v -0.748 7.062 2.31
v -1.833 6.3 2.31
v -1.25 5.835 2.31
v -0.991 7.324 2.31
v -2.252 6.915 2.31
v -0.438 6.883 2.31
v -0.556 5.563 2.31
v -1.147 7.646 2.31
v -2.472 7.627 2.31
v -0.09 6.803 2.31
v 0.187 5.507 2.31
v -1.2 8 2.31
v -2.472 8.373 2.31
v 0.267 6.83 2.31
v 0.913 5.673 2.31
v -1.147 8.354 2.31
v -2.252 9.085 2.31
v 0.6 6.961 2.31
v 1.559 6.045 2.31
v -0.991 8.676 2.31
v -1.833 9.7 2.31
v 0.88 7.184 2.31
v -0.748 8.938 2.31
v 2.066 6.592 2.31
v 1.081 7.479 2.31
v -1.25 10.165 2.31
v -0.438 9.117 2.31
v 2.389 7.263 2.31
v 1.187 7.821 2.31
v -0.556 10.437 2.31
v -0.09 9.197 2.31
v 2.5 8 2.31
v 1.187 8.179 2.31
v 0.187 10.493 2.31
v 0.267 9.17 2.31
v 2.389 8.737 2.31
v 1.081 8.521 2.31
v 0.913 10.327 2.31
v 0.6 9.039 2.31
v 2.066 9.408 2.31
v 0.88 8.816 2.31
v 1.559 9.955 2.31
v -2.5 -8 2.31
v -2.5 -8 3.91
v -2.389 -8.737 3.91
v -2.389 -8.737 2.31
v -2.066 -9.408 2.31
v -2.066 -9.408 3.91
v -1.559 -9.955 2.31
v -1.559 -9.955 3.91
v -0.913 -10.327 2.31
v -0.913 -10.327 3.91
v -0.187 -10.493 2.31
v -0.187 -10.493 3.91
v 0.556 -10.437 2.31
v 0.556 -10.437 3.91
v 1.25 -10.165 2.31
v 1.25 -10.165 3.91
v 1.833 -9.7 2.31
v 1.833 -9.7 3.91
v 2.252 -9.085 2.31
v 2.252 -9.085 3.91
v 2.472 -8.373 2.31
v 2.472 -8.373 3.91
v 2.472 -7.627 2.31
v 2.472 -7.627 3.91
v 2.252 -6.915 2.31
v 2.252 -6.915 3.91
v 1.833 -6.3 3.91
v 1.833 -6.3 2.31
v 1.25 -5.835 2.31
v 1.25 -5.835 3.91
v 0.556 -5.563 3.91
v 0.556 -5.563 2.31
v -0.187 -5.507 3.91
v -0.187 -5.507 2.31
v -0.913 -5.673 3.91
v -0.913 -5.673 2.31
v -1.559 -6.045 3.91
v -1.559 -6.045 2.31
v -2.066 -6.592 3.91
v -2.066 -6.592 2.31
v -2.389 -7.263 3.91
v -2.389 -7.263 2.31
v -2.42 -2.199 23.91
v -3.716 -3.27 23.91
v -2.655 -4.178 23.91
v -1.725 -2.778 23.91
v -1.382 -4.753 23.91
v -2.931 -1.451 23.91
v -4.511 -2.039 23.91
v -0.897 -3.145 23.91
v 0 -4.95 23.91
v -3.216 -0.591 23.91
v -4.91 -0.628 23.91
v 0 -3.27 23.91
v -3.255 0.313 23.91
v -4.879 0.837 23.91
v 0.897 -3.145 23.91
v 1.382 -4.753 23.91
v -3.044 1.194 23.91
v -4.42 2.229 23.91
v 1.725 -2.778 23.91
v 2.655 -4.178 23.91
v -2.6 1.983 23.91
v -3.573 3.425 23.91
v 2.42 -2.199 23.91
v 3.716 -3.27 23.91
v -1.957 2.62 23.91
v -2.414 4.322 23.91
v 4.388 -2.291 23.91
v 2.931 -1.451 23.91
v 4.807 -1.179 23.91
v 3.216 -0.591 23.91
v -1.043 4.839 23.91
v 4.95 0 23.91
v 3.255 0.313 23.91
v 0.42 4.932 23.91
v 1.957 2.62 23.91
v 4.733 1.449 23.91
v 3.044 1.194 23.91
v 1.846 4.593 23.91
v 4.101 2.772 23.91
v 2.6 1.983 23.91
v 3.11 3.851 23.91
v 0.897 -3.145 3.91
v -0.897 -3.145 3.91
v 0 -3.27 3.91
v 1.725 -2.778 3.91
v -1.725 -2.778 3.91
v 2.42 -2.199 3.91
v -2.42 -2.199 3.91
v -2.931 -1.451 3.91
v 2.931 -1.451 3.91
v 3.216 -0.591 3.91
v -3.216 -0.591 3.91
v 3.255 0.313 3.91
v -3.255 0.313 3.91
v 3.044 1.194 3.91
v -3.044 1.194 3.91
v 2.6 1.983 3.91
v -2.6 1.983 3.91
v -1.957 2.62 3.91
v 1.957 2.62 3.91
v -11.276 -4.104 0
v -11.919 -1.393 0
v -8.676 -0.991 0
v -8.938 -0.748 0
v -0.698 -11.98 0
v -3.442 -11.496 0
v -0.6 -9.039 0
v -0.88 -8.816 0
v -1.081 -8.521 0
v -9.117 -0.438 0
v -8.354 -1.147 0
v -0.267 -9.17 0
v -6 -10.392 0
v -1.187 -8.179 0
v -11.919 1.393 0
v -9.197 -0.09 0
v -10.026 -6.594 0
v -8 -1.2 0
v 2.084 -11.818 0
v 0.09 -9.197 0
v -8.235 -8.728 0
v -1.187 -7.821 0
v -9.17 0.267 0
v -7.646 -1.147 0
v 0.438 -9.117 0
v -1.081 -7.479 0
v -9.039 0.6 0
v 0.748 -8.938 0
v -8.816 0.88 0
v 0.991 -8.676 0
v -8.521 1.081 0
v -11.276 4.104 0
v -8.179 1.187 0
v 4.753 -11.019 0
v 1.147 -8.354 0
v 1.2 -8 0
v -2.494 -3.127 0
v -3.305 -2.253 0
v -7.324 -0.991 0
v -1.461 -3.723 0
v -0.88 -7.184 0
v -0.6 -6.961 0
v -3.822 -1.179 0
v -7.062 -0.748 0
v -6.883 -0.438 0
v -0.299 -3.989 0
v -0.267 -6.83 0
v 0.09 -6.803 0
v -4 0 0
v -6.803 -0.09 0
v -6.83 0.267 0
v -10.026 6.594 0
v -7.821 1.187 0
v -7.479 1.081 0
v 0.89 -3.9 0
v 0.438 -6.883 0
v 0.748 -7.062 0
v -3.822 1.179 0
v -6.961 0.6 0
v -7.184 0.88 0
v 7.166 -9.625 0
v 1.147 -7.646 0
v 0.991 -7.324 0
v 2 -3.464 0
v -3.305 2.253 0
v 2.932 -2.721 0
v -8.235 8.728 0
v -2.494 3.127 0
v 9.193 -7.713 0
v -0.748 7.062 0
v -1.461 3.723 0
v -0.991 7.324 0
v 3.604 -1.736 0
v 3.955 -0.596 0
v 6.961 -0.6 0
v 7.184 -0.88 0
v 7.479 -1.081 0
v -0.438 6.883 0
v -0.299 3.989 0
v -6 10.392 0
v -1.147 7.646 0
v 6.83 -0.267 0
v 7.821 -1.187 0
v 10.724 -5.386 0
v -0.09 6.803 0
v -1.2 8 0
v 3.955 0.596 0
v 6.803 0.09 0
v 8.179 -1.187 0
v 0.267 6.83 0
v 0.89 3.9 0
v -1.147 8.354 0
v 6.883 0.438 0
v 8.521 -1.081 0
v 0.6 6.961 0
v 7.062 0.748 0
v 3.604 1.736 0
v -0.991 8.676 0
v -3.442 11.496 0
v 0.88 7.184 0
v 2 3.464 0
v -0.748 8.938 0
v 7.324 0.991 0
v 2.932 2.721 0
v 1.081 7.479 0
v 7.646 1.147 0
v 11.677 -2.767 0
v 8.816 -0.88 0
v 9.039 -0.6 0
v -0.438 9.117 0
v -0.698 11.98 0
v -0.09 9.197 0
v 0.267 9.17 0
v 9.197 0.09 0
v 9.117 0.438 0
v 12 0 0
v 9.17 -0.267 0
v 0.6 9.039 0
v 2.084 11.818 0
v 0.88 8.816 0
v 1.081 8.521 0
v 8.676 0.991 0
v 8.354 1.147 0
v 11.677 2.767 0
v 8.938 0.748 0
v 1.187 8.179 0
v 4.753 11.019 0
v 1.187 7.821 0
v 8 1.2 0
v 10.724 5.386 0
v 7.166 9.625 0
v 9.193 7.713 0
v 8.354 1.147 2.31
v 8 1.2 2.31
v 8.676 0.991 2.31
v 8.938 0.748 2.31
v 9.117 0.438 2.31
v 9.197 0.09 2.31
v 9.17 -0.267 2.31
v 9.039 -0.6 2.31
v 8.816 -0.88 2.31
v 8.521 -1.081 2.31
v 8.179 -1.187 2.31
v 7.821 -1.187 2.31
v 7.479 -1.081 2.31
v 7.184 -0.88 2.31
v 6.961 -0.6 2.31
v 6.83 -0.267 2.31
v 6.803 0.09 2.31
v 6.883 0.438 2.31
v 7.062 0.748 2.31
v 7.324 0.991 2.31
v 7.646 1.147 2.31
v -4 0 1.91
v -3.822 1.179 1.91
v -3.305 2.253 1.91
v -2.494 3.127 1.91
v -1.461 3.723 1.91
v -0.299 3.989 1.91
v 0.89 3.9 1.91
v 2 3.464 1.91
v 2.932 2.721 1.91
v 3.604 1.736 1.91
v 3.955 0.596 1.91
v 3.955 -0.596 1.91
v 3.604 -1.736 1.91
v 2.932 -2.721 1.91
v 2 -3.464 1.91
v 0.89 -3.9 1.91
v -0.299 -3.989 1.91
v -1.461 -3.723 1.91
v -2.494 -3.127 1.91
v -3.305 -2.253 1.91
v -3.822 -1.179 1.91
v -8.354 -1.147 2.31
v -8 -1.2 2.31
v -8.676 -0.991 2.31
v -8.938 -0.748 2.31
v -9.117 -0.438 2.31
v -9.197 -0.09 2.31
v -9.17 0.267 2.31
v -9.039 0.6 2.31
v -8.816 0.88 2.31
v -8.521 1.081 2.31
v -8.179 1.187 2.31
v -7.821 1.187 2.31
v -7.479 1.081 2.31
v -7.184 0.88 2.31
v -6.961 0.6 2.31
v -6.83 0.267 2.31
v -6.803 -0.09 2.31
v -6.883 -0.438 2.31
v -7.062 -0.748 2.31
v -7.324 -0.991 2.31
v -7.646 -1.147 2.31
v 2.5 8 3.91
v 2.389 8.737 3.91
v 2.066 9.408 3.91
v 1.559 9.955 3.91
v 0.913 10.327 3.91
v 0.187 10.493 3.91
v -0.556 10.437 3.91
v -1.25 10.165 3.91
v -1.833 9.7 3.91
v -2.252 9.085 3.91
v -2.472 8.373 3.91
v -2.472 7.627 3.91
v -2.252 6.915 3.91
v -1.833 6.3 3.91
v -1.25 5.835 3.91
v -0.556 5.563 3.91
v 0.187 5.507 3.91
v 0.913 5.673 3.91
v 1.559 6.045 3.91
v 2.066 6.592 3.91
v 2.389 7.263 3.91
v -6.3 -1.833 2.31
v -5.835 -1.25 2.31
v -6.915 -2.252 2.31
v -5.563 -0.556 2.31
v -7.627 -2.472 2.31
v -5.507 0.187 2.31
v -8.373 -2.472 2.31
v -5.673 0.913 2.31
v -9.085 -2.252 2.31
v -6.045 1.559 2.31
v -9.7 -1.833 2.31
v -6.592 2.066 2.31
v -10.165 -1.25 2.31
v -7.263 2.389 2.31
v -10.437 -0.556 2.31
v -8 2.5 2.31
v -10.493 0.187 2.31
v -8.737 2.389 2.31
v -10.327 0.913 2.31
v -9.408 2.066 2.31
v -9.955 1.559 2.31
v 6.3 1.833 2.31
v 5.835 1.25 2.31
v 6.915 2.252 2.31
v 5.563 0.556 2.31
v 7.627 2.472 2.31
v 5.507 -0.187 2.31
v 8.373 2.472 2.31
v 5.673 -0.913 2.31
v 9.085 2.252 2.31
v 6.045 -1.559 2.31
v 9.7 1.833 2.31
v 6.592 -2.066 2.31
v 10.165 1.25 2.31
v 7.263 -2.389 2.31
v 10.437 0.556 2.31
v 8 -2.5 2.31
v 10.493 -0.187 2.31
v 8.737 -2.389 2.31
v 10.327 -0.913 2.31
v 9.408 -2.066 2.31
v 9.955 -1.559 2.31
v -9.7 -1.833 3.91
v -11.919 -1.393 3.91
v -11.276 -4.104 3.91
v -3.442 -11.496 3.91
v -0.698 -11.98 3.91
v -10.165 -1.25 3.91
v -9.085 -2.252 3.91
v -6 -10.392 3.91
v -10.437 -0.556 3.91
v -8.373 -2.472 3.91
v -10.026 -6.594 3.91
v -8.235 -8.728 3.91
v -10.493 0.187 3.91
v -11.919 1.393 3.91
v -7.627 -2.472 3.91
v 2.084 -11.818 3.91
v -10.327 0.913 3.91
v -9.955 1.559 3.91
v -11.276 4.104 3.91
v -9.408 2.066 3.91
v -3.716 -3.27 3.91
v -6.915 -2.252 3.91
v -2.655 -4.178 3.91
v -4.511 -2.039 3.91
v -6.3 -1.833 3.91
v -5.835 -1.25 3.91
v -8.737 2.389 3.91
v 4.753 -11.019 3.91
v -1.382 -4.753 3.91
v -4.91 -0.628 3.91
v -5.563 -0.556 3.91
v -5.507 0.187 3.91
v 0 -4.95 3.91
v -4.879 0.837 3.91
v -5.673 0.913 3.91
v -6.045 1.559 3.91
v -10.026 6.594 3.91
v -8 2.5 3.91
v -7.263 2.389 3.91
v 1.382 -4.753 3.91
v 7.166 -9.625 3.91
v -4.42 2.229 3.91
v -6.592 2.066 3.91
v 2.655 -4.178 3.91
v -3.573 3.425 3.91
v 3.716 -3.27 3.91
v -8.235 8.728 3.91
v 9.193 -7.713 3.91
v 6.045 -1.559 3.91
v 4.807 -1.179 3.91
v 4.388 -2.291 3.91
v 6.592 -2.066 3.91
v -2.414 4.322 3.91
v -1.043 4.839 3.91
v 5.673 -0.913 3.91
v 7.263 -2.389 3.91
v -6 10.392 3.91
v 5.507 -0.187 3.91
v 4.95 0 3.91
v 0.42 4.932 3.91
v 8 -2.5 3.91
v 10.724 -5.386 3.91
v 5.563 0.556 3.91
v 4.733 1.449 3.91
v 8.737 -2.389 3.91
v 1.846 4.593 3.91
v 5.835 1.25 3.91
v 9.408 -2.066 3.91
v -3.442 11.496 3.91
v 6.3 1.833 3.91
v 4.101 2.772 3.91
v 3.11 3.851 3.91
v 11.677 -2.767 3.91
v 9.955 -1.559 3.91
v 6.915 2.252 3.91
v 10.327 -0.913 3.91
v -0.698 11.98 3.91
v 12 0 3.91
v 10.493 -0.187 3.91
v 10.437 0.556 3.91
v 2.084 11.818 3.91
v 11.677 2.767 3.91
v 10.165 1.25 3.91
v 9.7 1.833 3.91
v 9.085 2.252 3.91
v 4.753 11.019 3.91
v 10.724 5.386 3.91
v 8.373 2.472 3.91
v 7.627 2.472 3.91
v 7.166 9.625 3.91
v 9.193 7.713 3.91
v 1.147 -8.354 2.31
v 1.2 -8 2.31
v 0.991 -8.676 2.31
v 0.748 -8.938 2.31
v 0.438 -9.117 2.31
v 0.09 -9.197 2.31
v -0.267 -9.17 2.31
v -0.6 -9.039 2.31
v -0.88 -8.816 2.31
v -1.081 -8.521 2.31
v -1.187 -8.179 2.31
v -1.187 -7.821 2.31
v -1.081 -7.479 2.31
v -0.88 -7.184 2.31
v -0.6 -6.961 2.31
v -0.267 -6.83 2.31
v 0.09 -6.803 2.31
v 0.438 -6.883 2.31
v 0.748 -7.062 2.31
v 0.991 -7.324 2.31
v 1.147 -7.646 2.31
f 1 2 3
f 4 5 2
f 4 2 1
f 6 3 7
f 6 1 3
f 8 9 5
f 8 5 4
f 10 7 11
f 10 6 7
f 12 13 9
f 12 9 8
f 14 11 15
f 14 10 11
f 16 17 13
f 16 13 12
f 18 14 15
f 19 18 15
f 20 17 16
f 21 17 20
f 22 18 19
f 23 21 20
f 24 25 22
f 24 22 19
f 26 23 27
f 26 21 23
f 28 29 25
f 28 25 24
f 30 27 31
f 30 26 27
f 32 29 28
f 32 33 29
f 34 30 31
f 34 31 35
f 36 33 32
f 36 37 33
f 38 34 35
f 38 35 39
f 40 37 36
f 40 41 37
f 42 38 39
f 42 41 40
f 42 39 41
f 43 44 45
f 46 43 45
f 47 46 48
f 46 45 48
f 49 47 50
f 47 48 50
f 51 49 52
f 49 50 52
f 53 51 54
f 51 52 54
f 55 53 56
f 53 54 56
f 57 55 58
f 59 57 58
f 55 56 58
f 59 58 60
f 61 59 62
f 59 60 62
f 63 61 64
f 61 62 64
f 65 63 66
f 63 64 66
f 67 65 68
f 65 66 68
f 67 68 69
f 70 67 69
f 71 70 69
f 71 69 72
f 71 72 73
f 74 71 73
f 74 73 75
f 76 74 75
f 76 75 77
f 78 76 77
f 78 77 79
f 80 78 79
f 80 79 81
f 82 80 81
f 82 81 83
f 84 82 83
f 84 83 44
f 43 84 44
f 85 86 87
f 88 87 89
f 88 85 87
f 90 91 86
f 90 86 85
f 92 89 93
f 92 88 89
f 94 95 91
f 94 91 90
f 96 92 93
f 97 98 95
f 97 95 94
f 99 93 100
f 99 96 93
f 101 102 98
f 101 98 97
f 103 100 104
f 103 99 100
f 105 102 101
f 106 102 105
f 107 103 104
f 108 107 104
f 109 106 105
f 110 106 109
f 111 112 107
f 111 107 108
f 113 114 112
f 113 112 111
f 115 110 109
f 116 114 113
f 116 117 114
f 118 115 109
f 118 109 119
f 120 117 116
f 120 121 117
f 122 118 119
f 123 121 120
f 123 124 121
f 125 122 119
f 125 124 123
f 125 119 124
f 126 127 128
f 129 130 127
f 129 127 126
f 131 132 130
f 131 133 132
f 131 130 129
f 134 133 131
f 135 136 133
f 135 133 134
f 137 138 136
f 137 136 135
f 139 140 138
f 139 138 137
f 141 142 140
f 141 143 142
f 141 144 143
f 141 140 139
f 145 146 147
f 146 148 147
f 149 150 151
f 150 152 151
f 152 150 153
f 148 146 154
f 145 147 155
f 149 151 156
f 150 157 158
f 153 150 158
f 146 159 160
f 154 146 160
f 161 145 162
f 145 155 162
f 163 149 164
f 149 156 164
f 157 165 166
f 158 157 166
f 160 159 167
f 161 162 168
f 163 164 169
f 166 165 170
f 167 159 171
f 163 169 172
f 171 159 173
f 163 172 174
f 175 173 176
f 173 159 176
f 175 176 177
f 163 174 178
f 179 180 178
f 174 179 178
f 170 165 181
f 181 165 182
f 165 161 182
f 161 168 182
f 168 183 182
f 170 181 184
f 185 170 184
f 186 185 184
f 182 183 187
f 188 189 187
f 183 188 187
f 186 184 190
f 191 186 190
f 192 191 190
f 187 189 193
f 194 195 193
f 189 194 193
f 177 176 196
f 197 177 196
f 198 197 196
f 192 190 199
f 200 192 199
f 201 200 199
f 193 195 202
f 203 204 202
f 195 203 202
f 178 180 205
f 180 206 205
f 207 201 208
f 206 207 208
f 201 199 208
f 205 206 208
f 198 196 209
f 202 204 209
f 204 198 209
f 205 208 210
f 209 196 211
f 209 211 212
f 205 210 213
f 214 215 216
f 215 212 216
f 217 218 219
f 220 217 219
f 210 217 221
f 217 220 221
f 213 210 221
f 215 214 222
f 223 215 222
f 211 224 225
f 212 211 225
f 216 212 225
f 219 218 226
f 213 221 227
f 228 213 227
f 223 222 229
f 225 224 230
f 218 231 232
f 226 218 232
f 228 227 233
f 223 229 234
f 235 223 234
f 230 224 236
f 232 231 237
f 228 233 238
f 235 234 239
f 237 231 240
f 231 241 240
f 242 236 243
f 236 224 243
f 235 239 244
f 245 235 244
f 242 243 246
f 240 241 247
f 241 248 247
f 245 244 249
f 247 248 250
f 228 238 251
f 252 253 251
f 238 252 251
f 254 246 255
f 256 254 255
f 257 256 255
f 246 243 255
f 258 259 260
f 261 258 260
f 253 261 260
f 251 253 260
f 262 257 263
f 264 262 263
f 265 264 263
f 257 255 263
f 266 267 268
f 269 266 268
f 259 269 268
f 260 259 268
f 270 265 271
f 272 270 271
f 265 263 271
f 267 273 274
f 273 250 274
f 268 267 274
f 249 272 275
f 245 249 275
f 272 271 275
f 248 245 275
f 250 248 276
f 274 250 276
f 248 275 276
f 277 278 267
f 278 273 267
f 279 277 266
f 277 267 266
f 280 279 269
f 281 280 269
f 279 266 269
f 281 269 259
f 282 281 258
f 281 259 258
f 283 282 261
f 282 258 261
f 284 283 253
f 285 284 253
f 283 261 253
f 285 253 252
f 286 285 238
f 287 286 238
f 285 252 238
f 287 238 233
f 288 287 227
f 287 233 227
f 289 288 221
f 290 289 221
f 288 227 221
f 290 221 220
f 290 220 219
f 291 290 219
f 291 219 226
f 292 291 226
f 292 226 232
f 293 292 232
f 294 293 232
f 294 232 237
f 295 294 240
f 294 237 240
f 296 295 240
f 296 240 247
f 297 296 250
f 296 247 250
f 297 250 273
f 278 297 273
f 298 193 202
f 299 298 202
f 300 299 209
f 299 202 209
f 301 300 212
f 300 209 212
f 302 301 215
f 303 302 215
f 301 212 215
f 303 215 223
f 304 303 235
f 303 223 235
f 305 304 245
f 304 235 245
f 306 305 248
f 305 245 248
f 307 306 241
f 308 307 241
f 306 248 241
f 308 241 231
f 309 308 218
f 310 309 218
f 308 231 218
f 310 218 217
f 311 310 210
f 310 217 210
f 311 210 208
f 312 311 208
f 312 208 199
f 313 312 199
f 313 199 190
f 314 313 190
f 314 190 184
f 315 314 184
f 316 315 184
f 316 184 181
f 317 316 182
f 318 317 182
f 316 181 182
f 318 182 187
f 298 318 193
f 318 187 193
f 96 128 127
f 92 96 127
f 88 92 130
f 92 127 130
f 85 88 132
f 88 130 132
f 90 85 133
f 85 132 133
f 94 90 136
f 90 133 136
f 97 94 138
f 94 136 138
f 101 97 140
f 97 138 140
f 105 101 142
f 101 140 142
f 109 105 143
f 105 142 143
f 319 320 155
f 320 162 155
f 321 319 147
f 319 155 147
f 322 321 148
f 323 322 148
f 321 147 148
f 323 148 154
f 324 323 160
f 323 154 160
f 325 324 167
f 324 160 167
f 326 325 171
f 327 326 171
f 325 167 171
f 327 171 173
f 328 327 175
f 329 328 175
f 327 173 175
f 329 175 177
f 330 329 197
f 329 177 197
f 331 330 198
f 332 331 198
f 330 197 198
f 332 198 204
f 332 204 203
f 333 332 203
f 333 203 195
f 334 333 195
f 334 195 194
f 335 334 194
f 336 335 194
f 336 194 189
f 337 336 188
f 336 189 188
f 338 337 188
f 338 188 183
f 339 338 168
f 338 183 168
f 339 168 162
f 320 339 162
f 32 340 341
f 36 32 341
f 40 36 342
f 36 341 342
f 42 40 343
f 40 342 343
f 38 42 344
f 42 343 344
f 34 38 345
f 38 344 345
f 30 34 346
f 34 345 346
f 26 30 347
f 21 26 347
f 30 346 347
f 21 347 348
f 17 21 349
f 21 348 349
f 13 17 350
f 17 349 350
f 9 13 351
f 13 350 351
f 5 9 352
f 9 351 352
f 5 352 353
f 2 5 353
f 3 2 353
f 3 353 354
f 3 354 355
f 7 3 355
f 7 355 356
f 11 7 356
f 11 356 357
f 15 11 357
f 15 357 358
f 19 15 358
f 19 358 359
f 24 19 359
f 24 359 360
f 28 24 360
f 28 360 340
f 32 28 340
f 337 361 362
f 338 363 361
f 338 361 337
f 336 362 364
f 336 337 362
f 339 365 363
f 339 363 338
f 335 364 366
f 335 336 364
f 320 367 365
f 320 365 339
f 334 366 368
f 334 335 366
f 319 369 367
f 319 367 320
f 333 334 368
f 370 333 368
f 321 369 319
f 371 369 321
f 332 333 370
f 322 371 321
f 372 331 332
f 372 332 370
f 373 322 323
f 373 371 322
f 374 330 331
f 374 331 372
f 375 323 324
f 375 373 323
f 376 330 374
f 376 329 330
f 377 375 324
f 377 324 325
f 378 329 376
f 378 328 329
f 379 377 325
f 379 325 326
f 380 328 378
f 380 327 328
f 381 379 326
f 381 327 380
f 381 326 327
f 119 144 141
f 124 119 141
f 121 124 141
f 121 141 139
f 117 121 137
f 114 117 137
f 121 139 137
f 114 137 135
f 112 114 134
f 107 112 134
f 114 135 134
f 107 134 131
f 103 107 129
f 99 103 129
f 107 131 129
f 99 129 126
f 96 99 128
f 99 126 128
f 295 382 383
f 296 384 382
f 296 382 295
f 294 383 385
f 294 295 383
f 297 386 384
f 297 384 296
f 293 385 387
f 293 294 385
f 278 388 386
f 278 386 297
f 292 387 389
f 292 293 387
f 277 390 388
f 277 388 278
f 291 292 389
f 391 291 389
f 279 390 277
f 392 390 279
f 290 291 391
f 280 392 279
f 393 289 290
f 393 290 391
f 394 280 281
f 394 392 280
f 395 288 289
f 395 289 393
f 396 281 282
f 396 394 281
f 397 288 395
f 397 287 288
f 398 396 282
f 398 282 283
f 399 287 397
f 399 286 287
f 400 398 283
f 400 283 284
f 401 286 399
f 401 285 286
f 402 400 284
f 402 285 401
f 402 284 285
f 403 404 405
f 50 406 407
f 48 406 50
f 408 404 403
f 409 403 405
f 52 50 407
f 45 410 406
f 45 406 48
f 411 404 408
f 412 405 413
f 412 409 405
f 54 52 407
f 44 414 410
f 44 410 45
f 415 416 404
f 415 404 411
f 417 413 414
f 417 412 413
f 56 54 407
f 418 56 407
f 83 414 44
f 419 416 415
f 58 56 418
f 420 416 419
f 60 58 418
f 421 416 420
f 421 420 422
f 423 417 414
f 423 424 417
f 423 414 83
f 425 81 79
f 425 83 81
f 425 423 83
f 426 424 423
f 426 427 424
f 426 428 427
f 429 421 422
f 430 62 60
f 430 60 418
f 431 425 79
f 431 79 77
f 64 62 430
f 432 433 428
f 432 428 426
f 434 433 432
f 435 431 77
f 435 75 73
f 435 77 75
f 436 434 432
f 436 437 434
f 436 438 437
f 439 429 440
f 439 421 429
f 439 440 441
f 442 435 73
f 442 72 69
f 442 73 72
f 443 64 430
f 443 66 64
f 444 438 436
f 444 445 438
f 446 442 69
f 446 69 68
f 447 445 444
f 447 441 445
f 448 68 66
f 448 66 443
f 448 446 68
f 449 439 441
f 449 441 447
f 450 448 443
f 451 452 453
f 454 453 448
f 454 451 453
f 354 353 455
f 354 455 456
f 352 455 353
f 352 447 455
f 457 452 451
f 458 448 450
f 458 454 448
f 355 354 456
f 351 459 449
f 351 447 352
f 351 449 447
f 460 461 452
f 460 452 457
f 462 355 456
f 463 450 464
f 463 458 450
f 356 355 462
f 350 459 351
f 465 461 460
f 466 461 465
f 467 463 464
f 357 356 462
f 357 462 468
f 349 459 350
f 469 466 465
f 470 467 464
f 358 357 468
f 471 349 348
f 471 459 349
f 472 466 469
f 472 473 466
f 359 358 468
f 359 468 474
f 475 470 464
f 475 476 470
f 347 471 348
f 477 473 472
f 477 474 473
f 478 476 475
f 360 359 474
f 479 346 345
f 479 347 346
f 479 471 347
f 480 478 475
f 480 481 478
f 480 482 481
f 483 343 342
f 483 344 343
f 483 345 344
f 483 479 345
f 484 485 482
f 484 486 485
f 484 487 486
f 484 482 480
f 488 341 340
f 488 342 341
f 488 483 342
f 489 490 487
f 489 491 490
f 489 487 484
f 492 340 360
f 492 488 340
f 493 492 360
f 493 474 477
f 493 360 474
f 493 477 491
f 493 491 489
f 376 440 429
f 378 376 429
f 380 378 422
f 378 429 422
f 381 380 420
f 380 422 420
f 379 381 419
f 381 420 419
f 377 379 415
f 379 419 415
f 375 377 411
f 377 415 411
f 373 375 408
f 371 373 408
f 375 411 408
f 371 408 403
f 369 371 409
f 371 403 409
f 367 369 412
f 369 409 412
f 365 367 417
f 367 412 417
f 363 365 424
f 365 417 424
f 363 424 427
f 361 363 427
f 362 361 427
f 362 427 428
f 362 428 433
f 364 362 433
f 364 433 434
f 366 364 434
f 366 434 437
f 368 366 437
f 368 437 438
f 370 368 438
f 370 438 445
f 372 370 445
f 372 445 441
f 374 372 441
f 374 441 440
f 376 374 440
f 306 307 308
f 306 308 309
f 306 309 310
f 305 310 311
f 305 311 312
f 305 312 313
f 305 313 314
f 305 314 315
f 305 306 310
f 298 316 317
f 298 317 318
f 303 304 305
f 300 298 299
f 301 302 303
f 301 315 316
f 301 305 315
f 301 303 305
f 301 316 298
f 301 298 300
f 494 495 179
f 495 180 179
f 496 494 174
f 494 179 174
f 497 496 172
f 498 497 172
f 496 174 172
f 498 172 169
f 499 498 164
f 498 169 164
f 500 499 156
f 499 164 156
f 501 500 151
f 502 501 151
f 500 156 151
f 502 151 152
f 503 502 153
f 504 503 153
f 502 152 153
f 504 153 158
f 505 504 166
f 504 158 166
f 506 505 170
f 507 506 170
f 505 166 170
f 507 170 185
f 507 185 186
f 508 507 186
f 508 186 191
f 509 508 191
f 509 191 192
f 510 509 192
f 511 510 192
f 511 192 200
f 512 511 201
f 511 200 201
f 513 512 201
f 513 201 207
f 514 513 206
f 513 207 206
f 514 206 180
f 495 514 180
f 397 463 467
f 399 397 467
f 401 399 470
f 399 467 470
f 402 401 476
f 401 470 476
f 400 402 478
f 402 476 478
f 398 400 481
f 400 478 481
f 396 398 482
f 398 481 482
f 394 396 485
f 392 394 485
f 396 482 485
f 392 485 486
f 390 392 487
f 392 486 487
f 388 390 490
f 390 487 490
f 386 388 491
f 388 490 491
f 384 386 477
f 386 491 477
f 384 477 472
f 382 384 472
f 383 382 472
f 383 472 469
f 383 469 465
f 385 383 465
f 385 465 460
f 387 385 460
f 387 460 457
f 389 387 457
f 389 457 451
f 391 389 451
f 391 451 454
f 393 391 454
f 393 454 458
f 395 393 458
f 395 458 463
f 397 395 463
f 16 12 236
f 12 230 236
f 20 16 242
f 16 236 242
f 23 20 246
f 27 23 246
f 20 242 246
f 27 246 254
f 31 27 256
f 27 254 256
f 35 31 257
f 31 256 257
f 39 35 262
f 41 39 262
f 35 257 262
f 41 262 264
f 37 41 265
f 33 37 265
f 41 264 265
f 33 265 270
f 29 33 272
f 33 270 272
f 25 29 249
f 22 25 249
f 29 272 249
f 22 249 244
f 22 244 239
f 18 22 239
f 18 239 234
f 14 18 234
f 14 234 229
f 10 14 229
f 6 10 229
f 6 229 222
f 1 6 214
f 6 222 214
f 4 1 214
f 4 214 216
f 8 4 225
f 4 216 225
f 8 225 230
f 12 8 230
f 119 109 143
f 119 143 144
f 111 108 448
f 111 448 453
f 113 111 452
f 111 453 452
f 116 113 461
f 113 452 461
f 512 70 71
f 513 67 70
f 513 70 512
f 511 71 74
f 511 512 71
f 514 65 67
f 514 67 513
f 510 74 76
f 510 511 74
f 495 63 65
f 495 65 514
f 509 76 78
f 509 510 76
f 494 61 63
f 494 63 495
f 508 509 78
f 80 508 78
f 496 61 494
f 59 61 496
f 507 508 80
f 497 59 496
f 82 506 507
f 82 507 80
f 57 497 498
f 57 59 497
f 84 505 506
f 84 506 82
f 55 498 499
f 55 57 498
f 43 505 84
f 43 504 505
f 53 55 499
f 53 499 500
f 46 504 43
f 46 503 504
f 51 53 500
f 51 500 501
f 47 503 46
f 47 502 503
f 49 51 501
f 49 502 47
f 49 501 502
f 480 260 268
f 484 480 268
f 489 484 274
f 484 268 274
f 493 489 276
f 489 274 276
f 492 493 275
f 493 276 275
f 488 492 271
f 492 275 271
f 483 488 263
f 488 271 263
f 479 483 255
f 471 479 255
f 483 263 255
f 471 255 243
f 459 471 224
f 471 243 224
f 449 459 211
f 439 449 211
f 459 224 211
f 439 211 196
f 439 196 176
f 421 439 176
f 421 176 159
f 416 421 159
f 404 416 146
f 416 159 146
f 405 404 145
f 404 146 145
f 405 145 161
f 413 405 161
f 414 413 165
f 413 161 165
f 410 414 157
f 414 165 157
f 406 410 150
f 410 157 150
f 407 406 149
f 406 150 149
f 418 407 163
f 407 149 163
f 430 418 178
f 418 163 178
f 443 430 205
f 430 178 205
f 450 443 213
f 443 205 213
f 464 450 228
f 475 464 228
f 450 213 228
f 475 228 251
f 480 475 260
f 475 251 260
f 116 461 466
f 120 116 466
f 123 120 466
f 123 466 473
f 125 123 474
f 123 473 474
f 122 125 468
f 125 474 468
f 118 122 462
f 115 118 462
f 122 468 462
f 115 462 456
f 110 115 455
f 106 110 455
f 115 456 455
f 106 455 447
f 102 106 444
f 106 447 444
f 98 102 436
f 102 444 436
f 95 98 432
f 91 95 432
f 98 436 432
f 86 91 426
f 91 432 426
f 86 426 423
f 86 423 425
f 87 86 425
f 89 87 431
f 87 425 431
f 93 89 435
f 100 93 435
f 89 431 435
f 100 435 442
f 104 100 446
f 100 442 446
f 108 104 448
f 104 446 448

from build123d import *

# Parameters (mm, degrees)
ESQUISSE1_R                                        = 12
BOSS_EXTRU_1_DEPTH                                 = 3.91
ESQUISSE6_R                                        = 4
ENL_V_MAT_EXTRU_2_DEPTH                            = 1.91
BOSS_EXTRU_2_DEPTH                                 = 20
CHAMBRAGE_POUR_VIS_T_TE_RONDE_BOMB_E_M_D           = 2.4
CHAMBRAGE_POUR_VIS_T_TE_RONDE_BOMB_E_M_CBORE_D     = 5
CHAMBRAGE_POUR_VIS_T_TE_RONDE_BOMB_E_M_CBORE_DEPTH = 1.6
R_P_TITION_CIRCULAIRE2_COUNT                       = 4


with BuildPart() as part:
    # Esquisse1 → Boss.-Extru.1 (new body)
    with BuildSketch(Plane.XY):
        Circle(ESQUISSE1_R)
    extrude(amount=BOSS_EXTRU_1_DEPTH)

    # Esquisse6 → Enlèv. mat.-Extru.2 (cut)
    with BuildSketch(Plane(origin=(0, 0, 0), x_dir=(-1, 0, 0), z_dir=(0, 0, -1))):
        Circle(ESQUISSE6_R)
    extrude(amount=-ENL_V_MAT_EXTRU_2_DEPTH, mode=Mode.SUBTRACT)

    # Esquisse7 → Boss.-Extru.2 (add)
    # profile 1 of 2: a face of its own
    with BuildSketch(Plane.XY.offset(3.91)):
        with BuildLine():
            Line((-3.716127016, -3.27), (0, -3.27))
            Line((0, -3.27), (3.716127016, -3.27))
            ThreePointArc((3.716127016, -3.27), (4.631270276, -1.747522714), (4.95, 0))
            ThreePointArc((4.95, 0), (-1.747522714, 4.631270276), (-3.716127016, -3.27))
        make_face()
        with BuildLine():
            Line((-1.956655309, 2.62), (1.956655309, 2.62))
            ThreePointArc((1.956655309, 2.62), (3.103248298, -1.030897667), (0, -3.27))
            ThreePointArc((0, -3.27), (-3.103248298, -1.030897667), (-1.956655309, 2.62))
        make_face(mode=Mode.SUBTRACT)
    # profile 2 of 2: a face of its own
    with BuildSketch(Plane.XY.offset(3.91)):
        with BuildLine():
            Line((3.716127016, -3.27), (0, -3.27))
            Line((0, -3.27), (-3.716127016, -3.27))
            ThreePointArc((-3.716127016, -3.27), (0, -4.95), (3.716127016, -3.27))
        make_face()
    extrude(amount=BOSS_EXTRU_2_DEPTH)

    # Chambrage pour vis à tête ronde bombée M21 (through all)
    with Locations(Plane.XY.offset(3.91)):
        with Locations((0, 8)):
            chambrage_pour_vis_t_te_ronde_bomb_e_m = CounterBoreHole(CHAMBRAGE_POUR_VIS_T_TE_RONDE_BOMB_E_M_D / 2, CHAMBRAGE_POUR_VIS_T_TE_RONDE_BOMB_E_M_CBORE_D / 2, CHAMBRAGE_POUR_VIS_T_TE_RONDE_BOMB_E_M_CBORE_DEPTH)

    # Répétition circulaire2: Chambrage pour vis à tête ronde bombée M21 ×4 about axis
    r_p_tition_circulaire2_axis = Axis((0, 0, 0), (0, 0, 1))
    for i in range(1, R_P_TITION_CIRCULAIRE2_COUNT):
        add(chambrage_pour_vis_t_te_ronde_bomb_e_m.rotate(r_p_tition_circulaire2_axis, i * 360 / R_P_TITION_CIRCULAIRE2_COUNT), mode=Mode.SUBTRACT)


solid = part.part
